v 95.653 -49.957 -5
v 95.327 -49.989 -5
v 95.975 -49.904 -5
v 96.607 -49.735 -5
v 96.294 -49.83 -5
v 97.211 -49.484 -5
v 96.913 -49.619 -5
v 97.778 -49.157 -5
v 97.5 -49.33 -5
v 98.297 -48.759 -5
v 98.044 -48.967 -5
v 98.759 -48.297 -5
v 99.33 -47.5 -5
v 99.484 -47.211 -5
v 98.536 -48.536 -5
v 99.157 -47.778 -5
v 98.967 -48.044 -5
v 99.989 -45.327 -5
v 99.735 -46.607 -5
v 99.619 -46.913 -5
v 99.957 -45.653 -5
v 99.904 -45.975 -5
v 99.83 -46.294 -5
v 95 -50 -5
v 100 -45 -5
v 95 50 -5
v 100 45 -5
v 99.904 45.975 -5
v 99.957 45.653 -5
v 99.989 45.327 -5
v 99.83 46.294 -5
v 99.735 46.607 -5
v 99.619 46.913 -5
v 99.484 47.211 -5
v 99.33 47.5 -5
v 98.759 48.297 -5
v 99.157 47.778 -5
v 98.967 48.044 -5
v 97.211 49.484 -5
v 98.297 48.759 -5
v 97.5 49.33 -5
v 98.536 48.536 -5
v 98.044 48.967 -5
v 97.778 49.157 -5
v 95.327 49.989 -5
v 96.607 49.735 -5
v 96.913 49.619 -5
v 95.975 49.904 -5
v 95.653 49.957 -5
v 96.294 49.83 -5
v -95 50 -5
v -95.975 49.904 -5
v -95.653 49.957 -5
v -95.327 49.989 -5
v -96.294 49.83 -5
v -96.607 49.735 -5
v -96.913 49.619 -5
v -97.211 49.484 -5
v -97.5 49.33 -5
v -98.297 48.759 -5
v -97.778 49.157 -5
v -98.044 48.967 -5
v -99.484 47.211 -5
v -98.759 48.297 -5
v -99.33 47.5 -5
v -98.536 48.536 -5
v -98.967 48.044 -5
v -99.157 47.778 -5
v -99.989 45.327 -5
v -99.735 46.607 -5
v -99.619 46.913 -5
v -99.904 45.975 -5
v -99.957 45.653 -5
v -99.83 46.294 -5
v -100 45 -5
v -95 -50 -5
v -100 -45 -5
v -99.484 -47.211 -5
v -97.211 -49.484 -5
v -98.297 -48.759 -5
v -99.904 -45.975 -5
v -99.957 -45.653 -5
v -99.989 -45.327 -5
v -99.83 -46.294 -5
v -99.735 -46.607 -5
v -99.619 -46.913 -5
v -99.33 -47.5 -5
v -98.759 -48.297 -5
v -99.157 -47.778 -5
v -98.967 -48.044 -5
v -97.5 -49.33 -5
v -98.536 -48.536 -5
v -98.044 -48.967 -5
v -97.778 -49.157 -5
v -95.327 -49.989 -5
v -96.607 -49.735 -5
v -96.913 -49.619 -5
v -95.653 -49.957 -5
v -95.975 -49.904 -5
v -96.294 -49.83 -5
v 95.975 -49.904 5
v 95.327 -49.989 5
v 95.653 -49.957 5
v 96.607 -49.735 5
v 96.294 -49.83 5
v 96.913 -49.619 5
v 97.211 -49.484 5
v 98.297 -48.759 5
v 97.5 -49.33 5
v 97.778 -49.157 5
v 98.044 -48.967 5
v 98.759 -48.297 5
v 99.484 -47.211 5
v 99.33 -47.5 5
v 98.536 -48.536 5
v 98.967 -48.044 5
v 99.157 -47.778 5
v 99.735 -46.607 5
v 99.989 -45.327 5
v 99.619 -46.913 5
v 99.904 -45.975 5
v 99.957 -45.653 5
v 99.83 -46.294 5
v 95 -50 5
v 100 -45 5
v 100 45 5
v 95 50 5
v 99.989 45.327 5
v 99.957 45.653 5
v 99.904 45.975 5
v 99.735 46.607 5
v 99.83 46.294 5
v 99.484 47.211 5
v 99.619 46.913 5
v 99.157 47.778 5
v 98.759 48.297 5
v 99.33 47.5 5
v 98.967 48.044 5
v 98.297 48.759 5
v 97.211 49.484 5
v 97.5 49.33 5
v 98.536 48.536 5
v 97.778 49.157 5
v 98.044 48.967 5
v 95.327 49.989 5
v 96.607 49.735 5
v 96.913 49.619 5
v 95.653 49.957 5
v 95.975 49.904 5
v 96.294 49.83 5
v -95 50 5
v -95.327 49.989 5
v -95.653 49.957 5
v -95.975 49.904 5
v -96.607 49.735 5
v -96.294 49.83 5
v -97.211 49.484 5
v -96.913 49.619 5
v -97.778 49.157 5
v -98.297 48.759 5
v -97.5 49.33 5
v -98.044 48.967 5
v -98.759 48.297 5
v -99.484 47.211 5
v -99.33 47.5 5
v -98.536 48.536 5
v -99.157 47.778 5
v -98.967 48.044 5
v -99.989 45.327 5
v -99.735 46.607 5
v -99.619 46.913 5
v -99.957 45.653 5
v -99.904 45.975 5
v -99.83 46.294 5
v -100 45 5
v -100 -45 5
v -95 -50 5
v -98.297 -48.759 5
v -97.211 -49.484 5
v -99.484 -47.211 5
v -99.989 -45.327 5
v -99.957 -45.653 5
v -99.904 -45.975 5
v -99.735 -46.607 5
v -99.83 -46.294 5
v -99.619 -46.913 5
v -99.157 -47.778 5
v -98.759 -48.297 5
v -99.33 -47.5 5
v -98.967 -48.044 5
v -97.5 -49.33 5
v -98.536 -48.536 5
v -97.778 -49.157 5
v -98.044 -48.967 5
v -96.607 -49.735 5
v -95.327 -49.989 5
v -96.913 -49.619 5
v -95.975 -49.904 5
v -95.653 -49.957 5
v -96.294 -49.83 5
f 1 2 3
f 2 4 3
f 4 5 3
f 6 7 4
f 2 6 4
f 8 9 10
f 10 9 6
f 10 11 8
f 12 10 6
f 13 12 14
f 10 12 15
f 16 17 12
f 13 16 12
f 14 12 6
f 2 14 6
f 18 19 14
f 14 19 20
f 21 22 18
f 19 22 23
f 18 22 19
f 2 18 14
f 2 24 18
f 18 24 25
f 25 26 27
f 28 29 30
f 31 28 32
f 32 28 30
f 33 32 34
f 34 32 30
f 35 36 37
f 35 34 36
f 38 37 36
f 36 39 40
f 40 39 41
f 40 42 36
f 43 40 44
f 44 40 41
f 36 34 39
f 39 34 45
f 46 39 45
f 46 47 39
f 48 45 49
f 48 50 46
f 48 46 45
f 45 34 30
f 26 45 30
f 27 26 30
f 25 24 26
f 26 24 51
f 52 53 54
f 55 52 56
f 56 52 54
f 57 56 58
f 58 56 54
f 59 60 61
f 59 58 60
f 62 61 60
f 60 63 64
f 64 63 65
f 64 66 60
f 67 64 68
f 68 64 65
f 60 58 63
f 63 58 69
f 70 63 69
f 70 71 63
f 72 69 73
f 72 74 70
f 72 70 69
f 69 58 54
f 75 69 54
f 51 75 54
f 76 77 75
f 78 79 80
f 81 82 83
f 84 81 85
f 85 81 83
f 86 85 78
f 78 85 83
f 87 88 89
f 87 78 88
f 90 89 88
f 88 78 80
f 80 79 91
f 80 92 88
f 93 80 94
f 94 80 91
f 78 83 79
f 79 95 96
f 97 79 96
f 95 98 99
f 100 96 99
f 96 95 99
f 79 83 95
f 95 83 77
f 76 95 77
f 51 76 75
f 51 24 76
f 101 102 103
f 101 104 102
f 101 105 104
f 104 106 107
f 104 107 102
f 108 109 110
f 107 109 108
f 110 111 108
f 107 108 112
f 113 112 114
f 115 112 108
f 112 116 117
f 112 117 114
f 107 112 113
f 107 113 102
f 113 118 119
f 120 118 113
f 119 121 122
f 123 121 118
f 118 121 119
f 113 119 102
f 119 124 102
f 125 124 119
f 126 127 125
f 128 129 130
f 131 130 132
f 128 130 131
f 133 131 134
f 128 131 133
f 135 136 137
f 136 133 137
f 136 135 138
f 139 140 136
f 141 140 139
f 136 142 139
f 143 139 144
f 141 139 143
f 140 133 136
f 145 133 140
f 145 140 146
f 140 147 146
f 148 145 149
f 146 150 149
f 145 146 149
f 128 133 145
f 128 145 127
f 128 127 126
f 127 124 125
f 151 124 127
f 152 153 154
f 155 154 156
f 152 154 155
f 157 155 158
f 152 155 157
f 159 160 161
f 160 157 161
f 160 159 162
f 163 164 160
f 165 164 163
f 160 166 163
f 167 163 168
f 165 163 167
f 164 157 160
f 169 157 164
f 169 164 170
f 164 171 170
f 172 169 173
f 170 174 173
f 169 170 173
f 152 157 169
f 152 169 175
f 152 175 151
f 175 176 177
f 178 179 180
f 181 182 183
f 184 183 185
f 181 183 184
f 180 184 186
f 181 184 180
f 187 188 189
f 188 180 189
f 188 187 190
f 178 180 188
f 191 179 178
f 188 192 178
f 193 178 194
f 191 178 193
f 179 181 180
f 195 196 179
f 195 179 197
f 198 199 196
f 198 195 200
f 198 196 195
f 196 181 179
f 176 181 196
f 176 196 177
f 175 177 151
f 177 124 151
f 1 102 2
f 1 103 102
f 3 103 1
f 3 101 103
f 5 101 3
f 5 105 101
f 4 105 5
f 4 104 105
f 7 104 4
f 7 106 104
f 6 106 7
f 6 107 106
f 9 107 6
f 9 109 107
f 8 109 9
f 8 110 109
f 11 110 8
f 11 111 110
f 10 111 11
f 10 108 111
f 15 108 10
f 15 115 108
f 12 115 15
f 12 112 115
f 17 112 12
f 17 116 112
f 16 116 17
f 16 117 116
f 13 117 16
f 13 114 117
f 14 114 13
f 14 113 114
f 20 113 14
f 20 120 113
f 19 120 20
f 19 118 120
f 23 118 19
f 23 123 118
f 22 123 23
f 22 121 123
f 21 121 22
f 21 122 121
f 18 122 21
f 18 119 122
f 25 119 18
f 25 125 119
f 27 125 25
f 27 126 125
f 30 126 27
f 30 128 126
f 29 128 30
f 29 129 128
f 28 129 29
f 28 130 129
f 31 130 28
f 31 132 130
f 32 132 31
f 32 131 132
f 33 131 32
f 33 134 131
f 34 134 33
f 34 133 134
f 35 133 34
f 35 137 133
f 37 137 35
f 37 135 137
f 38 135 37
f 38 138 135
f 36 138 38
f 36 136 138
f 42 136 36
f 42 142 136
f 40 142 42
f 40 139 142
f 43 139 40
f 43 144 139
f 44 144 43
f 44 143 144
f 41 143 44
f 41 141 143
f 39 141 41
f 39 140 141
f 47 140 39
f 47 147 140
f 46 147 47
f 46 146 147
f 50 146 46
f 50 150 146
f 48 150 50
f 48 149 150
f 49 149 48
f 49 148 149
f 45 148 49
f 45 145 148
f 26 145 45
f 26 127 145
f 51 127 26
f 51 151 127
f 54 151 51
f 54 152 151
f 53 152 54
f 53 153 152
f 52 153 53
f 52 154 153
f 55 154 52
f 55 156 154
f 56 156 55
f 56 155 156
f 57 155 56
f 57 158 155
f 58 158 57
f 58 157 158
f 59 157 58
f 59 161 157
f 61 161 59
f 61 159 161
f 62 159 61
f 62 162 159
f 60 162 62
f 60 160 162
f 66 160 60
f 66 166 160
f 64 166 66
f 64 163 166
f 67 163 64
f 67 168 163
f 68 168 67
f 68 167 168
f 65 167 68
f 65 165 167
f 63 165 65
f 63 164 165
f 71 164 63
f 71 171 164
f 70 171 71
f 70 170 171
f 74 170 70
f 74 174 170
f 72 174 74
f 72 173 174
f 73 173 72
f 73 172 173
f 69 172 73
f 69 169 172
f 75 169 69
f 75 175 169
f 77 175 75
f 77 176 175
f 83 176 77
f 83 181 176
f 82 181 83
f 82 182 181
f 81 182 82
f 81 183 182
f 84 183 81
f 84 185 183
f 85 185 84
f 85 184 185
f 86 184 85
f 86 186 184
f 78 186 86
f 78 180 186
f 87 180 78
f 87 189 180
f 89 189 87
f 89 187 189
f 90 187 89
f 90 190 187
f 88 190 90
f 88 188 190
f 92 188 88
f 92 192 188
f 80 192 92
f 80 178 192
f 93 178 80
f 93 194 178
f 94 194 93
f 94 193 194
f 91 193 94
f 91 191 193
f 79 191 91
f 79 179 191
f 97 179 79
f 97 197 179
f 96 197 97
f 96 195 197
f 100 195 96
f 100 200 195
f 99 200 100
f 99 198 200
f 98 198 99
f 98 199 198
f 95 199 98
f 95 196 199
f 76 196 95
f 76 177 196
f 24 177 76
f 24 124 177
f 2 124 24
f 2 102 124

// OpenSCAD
$fn = 96;

// Parameters for the tooling plate (mm)
length = 200;
width = 100;
thickness = 10;
corner_radius = 5;

// 3D tooling plate: one connected solid with rounded corners
module tooling_plate_sheet_3d(L=200, W=100, T=10, R=5) {
    R2 = min(R, min(L, W)/2);

    color([0.75, 0.75, 0.78])  // aluminum-like light gray
    linear_extrude(height=T, center=true, convexity=10)
        offset(r=R2)
            square([L - 2*R2, W - 2*R2], center=true);
}

tooling_plate_sheet_3d(length, width, thickness, corner_radius);
